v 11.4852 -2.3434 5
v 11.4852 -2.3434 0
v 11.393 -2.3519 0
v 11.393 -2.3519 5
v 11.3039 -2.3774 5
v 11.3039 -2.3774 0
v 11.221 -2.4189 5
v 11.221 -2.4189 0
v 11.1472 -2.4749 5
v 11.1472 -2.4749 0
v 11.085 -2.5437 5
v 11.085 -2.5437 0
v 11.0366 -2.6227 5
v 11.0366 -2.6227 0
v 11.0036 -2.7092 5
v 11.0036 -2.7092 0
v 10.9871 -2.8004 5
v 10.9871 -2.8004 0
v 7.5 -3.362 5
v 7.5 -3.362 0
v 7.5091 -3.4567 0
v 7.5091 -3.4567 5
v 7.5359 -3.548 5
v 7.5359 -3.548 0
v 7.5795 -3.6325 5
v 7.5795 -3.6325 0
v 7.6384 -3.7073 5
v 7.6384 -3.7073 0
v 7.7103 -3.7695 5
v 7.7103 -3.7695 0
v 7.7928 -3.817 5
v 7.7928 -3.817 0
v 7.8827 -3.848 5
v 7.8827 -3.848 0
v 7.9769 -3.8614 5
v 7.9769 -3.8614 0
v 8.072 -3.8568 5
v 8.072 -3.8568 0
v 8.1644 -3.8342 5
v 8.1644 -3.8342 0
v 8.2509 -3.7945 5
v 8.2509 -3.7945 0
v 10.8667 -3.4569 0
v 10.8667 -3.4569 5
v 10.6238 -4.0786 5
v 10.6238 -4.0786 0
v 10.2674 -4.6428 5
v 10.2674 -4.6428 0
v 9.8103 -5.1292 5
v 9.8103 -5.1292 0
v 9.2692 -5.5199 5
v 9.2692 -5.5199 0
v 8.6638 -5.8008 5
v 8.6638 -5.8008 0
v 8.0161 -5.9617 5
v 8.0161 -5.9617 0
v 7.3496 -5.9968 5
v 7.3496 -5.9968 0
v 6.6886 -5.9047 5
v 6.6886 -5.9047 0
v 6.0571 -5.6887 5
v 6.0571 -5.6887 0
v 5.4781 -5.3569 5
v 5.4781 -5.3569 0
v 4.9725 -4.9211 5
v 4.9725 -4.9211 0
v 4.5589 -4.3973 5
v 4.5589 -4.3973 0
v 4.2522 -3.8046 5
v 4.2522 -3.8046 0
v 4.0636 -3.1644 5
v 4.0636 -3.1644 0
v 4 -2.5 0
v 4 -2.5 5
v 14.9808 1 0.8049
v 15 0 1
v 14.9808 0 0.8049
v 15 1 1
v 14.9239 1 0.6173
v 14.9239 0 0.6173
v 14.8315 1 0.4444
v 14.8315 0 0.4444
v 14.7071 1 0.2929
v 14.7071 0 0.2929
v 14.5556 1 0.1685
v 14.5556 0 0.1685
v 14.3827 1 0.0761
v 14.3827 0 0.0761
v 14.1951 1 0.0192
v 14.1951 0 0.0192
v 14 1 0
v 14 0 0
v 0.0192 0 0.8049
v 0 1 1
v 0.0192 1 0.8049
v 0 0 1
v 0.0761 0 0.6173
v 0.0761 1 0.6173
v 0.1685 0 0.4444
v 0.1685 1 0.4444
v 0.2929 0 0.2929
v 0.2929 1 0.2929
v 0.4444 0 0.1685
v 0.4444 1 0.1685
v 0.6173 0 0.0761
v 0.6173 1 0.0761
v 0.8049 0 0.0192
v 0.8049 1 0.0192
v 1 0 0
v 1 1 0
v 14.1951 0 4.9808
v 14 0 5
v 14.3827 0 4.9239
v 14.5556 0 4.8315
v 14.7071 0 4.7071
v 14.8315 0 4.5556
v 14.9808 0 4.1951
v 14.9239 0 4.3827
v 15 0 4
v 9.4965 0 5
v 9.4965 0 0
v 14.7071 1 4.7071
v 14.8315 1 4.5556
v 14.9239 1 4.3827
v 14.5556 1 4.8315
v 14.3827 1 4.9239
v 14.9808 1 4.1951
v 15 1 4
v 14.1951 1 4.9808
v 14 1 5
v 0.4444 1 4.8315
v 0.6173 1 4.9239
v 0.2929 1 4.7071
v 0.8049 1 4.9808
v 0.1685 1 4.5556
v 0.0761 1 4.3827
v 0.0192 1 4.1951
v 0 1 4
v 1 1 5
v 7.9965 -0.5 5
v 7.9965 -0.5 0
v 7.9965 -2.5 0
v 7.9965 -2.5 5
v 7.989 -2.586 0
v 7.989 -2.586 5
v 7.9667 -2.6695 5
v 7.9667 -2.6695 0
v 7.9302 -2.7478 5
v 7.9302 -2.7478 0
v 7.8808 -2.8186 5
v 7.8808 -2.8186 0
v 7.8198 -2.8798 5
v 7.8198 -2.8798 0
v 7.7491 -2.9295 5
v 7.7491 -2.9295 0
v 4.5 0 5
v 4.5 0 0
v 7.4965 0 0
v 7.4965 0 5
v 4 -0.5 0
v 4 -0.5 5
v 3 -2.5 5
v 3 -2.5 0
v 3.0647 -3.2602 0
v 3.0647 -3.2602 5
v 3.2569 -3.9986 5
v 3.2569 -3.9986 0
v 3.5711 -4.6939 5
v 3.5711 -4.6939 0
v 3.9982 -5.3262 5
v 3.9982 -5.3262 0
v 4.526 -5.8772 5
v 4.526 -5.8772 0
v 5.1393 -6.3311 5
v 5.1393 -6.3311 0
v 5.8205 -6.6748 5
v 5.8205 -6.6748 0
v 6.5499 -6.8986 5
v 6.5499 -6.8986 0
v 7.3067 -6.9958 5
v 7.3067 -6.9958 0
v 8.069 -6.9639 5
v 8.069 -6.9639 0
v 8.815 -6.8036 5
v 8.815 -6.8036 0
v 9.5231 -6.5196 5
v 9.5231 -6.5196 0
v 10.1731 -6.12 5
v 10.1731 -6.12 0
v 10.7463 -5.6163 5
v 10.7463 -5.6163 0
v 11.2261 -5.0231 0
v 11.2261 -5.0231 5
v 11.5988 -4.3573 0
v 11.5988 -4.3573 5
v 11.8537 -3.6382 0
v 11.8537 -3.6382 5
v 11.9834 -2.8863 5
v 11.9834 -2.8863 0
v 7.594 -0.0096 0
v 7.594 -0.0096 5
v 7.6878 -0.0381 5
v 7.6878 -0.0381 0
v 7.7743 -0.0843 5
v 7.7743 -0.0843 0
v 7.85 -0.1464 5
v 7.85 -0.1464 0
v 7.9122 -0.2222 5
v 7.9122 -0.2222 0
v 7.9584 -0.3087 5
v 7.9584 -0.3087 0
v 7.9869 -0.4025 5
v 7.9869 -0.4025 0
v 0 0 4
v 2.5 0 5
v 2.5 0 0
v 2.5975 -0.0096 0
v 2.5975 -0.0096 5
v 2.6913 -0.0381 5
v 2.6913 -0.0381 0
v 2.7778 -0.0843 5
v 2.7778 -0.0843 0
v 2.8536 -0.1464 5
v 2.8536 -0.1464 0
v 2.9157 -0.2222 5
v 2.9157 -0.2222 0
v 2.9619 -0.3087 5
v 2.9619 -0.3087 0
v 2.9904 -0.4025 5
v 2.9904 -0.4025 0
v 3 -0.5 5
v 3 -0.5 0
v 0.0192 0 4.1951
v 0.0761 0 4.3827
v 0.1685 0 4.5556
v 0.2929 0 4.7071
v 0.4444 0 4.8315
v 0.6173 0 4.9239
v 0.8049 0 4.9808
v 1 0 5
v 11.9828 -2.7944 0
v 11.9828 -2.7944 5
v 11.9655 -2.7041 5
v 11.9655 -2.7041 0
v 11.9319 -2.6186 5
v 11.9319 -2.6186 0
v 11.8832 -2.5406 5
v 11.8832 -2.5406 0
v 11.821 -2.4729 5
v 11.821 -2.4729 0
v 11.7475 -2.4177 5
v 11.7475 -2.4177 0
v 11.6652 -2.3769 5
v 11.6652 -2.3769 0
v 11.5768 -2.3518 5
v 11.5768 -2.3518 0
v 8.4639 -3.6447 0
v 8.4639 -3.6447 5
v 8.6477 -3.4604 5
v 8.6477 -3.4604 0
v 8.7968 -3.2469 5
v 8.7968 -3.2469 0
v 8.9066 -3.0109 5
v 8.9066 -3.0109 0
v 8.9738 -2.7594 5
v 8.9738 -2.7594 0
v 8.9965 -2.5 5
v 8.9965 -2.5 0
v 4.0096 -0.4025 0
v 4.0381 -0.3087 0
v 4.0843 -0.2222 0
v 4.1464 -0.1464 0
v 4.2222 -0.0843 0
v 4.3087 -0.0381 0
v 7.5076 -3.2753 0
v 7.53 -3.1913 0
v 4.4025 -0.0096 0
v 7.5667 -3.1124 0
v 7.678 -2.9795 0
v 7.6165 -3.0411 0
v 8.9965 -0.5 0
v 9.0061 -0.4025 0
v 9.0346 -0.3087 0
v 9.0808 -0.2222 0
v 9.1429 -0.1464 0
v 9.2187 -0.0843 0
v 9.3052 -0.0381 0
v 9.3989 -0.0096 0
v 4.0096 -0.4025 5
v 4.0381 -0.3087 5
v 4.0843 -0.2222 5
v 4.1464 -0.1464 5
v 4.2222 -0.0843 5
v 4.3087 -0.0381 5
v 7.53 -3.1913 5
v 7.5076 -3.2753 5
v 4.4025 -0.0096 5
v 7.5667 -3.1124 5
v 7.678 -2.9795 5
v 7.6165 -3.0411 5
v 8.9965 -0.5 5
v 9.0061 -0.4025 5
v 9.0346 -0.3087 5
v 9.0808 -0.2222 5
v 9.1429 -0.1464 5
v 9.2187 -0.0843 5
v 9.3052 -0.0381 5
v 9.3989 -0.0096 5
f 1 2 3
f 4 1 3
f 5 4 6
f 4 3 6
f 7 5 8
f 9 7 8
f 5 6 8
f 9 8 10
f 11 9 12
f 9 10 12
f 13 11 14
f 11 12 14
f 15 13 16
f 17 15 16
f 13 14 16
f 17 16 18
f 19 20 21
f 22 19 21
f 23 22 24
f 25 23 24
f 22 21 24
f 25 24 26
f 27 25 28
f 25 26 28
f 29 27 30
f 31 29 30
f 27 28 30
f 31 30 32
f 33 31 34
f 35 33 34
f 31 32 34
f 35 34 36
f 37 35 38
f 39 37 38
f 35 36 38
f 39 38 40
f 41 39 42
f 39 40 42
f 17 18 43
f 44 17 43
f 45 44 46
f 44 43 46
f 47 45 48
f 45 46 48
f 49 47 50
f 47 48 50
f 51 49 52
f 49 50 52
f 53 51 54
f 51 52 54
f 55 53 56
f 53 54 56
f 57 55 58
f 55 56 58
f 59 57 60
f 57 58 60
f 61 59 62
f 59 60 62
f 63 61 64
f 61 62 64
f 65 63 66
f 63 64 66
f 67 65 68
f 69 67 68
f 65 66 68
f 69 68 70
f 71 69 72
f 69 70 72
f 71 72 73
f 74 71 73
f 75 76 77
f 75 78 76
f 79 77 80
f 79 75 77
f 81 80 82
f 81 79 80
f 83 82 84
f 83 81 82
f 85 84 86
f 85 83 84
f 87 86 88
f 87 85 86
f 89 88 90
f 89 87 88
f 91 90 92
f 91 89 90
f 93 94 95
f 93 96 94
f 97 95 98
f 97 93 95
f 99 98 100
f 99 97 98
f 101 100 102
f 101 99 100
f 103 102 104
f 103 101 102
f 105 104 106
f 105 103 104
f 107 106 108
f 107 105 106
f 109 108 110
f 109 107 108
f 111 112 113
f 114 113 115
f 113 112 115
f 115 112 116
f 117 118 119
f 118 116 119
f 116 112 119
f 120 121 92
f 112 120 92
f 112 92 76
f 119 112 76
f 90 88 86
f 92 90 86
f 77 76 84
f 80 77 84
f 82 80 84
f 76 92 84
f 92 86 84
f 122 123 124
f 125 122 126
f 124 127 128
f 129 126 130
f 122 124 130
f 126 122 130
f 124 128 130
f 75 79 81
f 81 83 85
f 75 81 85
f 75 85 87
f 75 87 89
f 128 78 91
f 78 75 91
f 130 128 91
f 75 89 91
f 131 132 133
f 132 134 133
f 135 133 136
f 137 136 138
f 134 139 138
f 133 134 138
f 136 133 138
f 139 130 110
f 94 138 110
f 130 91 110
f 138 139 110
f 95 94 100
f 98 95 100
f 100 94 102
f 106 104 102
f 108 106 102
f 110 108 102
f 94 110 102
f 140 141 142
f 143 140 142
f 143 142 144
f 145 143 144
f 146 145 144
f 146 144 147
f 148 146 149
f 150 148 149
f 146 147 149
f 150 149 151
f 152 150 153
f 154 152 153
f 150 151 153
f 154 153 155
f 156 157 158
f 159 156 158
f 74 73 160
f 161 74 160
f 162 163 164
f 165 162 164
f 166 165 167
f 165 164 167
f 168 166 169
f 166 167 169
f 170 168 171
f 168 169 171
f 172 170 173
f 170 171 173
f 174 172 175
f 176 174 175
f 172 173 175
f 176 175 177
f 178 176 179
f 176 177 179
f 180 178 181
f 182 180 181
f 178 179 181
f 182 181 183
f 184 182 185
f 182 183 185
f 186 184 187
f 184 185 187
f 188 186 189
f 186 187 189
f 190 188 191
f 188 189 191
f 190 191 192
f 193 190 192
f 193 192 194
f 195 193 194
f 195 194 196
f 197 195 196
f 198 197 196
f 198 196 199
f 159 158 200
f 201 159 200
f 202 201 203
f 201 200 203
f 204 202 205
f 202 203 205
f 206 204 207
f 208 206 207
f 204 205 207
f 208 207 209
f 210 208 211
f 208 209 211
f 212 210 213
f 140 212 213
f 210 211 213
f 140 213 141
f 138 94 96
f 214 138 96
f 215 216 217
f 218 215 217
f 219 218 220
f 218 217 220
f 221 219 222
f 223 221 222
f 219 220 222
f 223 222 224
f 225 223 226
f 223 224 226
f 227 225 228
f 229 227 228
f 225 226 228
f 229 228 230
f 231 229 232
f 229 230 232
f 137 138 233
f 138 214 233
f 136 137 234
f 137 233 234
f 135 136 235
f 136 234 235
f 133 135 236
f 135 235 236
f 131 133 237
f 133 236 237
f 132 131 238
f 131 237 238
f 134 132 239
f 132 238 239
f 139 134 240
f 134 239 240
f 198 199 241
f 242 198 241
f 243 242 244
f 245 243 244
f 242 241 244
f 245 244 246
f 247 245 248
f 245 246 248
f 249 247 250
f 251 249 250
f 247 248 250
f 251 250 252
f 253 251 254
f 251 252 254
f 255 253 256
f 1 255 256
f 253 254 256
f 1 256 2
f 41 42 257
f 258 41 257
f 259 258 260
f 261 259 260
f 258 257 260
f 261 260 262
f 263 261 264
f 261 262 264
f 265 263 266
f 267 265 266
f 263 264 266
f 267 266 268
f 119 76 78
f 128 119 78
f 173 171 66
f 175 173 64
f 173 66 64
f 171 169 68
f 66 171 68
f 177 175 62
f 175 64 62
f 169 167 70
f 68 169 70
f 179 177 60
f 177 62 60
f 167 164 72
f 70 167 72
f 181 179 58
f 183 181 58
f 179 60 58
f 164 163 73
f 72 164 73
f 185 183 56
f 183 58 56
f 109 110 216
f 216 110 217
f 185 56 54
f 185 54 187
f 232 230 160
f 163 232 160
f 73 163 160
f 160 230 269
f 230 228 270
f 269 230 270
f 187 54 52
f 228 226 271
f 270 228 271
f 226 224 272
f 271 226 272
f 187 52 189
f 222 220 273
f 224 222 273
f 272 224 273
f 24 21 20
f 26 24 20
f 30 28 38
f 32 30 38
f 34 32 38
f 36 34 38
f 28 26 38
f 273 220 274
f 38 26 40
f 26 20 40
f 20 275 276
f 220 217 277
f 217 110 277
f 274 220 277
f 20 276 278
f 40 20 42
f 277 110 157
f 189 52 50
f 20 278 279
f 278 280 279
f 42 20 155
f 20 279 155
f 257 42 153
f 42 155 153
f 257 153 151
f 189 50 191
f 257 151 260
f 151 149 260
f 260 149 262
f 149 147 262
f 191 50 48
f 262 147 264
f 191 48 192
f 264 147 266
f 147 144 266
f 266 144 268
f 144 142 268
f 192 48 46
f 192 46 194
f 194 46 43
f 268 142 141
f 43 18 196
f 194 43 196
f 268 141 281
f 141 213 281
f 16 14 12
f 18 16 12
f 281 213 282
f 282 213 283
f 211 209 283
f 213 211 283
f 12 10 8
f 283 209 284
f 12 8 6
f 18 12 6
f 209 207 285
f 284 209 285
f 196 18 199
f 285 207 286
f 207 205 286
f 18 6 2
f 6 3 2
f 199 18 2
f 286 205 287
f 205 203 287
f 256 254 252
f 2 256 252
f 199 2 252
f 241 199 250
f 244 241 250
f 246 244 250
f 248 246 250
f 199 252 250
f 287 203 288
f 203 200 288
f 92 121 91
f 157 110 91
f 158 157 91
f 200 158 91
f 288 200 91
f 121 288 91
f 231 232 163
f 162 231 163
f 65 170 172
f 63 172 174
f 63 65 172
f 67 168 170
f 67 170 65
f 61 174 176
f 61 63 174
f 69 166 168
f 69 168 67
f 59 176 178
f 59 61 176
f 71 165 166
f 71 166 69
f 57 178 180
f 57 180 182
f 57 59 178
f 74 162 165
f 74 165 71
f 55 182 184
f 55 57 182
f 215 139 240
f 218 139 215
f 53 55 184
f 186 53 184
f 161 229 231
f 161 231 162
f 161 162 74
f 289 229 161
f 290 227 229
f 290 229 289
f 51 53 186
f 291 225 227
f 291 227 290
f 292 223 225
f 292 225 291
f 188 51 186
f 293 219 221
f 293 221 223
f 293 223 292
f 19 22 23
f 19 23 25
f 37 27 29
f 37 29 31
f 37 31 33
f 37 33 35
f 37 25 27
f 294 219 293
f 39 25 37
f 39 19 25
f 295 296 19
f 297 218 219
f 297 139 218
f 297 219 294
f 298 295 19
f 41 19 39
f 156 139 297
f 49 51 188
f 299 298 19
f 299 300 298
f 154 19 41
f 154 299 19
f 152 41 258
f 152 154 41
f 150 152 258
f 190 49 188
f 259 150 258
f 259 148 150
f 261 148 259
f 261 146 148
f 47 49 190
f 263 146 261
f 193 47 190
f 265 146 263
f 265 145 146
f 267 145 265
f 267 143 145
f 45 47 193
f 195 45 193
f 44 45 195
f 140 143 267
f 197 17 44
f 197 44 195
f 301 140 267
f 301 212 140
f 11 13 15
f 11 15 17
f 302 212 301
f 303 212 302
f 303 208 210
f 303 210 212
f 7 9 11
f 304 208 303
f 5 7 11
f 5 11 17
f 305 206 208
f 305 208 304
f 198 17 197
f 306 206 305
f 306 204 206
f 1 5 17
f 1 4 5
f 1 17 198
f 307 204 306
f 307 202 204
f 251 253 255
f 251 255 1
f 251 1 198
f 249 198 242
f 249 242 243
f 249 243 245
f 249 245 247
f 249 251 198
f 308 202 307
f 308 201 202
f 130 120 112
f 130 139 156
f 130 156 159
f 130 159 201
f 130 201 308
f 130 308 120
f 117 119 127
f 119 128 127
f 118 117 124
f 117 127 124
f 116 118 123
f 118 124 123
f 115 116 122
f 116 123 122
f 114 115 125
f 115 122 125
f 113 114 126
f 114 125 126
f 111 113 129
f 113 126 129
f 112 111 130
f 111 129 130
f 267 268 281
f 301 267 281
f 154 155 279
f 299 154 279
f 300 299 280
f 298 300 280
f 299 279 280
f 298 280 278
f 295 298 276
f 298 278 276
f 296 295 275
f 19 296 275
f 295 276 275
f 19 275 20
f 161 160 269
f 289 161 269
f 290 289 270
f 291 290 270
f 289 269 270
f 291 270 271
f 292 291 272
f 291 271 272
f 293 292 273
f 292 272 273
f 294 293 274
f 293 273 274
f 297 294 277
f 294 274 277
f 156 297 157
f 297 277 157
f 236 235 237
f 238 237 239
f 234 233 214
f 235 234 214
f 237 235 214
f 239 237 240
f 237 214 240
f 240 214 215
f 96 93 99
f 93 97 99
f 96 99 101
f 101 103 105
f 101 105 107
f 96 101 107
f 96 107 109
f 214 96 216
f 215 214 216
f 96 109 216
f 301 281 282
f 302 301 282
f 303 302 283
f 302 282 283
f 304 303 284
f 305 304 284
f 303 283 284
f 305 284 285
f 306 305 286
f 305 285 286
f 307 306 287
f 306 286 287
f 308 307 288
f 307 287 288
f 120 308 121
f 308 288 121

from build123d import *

# Parameters (mm, degrees)
F1_DEPTH = 5
F2_R     = 1


with BuildPart() as f1:
    # F0 (on Top) → F1 (new body)
    with BuildSketch(Plane.XY):
        with BuildLine():
            ThreePointArc((4, -0.5), (4.146447, -0.146447), (4.5, 0))
            Line((4.5, 0), (7.496493, 0))
            ThreePointArc((7.496493, 0), (7.850046, -0.146447), (7.996493, -0.5))
            Line((7.996493, -0.5), (7.996493, -2.5))
            ThreePointArc((7.996493, -2.5), (7.930228, -2.747809), (7.74912, -2.92947))
            ThreePointArc((7.74912, -2.92947), (7.566733, -3.112414), (7.5, -3.361974))
            ThreePointArc((7.5, -3.361974), (7.75044, -3.79524), (8.25088, -3.794477))
            ThreePointArc((8.25088, -3.794477), (8.796761, -3.246929), (8.996493, -2.5))
            Line((8.996493, -2.5), (8.996493, -0.5))
            ThreePointArc((8.996493, -0.5), (9.14294, -0.146447), (9.496493, 0))
            Line((9.496493, 0), (15, 0))
            Line((15, 0), (15, 1))
            Line((15, 1), (0, 1))
            Line((0, 1), (0, 0))
            Line((0, 0), (2.5, 0))
            ThreePointArc((2.5, 0), (2.853553, -0.146447), (3, -0.5))
            Line((3, -0.5), (3, -2.5))
            ThreePointArc((3, -2.5), (7.306682, -6.995846), (11.98339, -2.88628))
            ThreePointArc((11.98339, -2.88628), (11.853651, -2.505321), (11.485236, -2.34336))
            ThreePointArc((11.485236, -2.34336), (11.147197, -2.474944), (10.987081, -2.80044))
            ThreePointArc((10.987081, -2.80044), (7.349641, -5.996769), (4, -2.5))
            Line((4, -2.5), (4, -0.5))
        make_face()
    extrude(amount=F1_DEPTH)

    # F2
    f2_edges = [f1.edges().sort_by_distance(p)[0] for p in [
        (15, 0.5, 5),
        (15, 0.5, 0),
        (0, 0.5, 5),
        (0, 0.5, 0),
    ]]
    fillet(f2_edges, radius=F2_R)


solid = f1.part
